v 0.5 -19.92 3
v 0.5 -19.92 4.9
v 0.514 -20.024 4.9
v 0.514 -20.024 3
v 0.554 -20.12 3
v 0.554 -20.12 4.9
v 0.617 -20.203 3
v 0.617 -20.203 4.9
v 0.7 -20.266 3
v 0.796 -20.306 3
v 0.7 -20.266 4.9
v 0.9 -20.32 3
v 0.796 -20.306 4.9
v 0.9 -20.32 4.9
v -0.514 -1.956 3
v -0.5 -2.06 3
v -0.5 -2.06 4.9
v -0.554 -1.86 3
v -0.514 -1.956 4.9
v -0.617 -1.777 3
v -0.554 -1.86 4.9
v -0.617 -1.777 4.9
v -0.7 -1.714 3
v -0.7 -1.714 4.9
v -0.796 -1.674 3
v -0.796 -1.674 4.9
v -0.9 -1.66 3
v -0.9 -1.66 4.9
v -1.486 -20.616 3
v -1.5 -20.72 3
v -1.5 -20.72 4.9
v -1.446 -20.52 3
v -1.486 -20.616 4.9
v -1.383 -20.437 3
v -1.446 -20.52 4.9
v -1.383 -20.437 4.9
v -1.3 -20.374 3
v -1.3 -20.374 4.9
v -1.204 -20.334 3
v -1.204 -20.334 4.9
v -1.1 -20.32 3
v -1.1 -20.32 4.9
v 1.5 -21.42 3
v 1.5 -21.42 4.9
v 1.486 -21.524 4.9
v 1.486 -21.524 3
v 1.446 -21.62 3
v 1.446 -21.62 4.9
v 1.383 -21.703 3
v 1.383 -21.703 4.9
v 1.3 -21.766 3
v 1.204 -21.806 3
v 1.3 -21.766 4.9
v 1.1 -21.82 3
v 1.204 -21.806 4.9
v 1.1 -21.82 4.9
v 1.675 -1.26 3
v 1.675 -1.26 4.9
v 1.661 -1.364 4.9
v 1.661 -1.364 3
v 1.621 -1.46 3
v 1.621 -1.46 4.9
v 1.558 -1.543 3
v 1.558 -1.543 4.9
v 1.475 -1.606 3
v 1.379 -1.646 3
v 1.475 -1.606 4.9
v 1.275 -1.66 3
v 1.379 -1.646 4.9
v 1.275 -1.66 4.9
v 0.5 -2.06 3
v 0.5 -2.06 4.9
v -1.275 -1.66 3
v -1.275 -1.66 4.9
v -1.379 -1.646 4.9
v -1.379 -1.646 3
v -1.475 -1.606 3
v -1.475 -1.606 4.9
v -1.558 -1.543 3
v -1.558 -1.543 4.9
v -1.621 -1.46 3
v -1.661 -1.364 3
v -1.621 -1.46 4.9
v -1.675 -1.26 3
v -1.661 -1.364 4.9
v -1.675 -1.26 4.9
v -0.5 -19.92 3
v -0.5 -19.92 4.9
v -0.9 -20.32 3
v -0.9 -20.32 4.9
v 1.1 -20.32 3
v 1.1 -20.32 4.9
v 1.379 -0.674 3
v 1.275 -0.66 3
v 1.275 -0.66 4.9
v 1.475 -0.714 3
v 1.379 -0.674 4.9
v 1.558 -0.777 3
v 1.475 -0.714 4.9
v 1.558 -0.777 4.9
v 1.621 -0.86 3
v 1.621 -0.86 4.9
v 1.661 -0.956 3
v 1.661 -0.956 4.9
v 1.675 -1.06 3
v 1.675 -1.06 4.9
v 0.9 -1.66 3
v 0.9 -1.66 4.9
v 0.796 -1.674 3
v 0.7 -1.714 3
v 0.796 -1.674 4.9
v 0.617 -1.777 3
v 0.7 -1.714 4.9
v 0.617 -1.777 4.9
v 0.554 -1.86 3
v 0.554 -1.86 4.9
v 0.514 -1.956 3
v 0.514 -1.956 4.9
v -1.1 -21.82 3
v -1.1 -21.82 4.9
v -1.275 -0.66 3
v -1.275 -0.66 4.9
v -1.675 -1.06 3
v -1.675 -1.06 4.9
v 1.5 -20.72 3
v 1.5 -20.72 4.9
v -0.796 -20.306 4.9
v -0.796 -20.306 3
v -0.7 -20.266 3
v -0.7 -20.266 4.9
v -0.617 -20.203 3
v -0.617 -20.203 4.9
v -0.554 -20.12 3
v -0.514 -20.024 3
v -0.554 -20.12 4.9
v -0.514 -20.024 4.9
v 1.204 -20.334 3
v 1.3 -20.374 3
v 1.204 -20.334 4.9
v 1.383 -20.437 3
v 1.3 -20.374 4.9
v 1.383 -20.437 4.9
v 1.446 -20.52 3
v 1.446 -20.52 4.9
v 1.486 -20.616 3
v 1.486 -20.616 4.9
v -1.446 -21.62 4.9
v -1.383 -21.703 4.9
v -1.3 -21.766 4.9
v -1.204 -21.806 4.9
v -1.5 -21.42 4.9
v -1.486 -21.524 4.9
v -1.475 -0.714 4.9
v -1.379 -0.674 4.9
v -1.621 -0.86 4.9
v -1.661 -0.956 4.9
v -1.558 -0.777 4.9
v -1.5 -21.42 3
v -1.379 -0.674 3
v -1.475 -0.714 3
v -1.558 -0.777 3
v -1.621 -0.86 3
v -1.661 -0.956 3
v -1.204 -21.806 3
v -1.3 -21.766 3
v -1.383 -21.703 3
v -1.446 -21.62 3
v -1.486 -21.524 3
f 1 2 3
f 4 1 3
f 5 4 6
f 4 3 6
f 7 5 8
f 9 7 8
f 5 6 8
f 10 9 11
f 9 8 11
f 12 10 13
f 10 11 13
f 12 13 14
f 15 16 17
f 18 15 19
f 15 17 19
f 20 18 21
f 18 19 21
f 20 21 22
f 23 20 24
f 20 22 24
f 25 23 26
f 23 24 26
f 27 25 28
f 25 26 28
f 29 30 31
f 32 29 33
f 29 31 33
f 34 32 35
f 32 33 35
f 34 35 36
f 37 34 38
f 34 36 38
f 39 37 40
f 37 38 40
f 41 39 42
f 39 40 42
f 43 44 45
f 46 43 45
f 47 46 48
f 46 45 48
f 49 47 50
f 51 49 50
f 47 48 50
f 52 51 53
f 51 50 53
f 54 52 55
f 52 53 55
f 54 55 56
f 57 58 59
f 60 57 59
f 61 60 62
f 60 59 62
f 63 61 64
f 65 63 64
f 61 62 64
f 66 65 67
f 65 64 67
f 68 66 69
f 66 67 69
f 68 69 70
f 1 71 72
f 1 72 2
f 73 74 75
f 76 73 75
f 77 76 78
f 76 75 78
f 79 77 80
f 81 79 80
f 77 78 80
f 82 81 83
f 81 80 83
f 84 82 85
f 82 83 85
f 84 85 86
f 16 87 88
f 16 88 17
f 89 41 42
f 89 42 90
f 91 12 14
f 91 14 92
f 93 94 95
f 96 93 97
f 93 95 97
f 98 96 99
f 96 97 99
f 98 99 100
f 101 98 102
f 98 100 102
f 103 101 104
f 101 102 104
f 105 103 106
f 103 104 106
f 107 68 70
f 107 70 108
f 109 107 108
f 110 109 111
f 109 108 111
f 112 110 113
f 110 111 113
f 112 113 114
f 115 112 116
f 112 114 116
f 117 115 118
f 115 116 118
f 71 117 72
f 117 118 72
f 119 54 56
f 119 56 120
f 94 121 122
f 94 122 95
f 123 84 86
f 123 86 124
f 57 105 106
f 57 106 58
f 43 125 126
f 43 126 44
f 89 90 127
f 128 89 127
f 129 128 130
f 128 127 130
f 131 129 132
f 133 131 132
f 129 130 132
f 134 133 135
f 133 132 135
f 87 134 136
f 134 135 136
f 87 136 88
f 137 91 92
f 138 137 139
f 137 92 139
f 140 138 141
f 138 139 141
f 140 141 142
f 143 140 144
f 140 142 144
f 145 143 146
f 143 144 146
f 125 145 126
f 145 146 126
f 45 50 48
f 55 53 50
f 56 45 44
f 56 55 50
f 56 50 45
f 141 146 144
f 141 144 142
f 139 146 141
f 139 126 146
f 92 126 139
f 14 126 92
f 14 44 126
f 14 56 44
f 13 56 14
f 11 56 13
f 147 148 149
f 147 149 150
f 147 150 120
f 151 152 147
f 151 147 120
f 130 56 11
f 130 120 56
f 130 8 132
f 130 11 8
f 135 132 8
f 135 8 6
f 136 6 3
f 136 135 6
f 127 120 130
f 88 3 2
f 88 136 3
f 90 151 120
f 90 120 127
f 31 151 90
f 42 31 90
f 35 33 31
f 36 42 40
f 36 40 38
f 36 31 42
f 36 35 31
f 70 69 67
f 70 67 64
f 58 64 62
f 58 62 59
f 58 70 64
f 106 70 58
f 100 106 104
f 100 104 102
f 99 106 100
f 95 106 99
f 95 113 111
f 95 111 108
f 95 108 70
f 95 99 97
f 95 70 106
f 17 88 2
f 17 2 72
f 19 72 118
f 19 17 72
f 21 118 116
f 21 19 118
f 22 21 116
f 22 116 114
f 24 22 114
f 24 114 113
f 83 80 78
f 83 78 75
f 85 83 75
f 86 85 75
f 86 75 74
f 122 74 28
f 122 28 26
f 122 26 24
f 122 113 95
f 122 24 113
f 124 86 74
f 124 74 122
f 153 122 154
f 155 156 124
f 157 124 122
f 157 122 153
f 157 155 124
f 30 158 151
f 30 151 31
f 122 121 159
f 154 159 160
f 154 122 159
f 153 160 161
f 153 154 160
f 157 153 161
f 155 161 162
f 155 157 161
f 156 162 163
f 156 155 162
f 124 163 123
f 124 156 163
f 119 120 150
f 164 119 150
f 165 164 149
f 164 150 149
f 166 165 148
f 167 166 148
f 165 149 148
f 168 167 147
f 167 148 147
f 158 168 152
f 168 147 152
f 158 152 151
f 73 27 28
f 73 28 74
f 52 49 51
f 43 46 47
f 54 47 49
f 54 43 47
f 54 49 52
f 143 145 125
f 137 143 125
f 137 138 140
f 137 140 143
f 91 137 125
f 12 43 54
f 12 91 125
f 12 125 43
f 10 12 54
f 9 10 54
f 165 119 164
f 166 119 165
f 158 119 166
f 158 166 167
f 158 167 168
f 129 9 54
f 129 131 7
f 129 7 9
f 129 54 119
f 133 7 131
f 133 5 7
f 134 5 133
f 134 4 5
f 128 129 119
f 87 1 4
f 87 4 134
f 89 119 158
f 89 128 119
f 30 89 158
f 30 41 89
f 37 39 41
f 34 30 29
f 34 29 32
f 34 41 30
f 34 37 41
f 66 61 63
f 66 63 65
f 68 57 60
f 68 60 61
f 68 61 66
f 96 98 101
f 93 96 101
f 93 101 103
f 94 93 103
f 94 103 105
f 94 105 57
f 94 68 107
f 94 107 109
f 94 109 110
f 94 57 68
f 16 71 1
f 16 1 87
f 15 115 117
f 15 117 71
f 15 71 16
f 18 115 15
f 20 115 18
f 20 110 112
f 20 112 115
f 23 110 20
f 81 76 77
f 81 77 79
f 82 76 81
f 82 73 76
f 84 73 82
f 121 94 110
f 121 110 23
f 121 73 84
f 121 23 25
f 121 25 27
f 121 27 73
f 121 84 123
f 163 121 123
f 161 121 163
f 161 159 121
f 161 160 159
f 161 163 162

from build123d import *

# Parameters (mm, degrees)
PAD002_DEPTH    = 2
FILLET003_R     = 0.4
POCKET010_DEPTH = 0.1


with BuildPart() as part:
    # Sketch009 → Pad002 (new body)
    with BuildSketch(Plane.XY):
        Polygon((-1.675, -0.66), (1.675, -0.66), (1.675, -1.66), (0.5, -1.66), (0.5, -20.32), (1.5, -20.32), (1.5, -21.82), (-1.5, -21.82), (-1.5, -20.32), (-0.5, -20.32), (-0.5, -1.66), (-1.675, -1.66), align=None)
    extrude(amount=PAD002_DEPTH)

    # Fillet003
    fillet003_edges = [part.edges().sort_by_distance(p)[0] for p in [
        (-1.675, -1.66, 1),
        (-1.675, -0.66, 1),
        (1.675, -0.66, 1),
        (1.675, -1.66, 1),
        (0.5, -1.66, 1),
        (-0.5, -1.66, 1),
        (-0.5, -20.32, 1),
        (-1.5, -20.32, 1),
        (-1.5, -21.82, 1),
        (1.5, -21.82, 1),
        (1.5, -20.32, 1),
        (0.5, -20.32, 1),
    ]]
    fillet(fillet003_edges, radius=FILLET003_R)

    # Fillet003 Face5 → Pocket010 (cut)
    with BuildSketch(Plane(origin=(0, -11.4600006044, 2), x_dir=(0, 1, 0), z_dir=(0, 0, 1))):
        with BuildLine():
            Line((9.8000006044, 1.275), (9.8000006044, 0.9))
            ThreePointArc((9.8000006044, 0.9), (9.6828433168, 0.6171572875), (9.4000006044, 0.5))
            Line((9.4000006044, 0.5), (-8.4599993956, 0.5))
            ThreePointArc((-8.4599993956, 0.5), (-8.7428421081, 0.6171572875), (-8.8599993956, 0.9))
            Line((-8.8599993956, 0.9), (-8.8599993956, 1.1))
            ThreePointArc((-8.8599993956, 1.1), (-8.9771566832, 1.3828427125), (-9.2599993956, 1.5))
            Line((-9.2599993956, 1.5), (-9.9599993956, 1.5))
            ThreePointArc((-9.9599993956, 1.5), (-10.2428421081, 1.3828427125), (-10.3599993956, 1.1))
            Line((-10.3599993956, 1.1), (-10.3599993956, -1.1))
            ThreePointArc((-10.3599993956, -1.1), (-10.2428421081, -1.3828427125), (-9.9599993956, -1.5))
            Line((-9.9599993956, -1.5), (-9.2599993956, -1.5))
            ThreePointArc((-9.2599993956, -1.5), (-8.9771566832, -1.3828427125), (-8.8599993956, -1.1))
            Line((-8.8599993956, -1.1), (-8.8599993956, -0.9))
            ThreePointArc((-8.8599993956, -0.9), (-8.7428421081, -0.6171572875), (-8.4599993956, -0.5))
            Line((-8.4599993956, -0.5), (9.4000006044, -0.5))
            ThreePointArc((9.4000006044, -0.5), (9.6828433168, -0.6171572875), (9.8000006044, -0.9))
            Line((9.8000006044, -0.9), (9.8000006044, -1.275))
            ThreePointArc((9.8000006044, -1.275), (9.9171578919, -1.5578427125), (10.2000006044, -1.675))
            Line((10.2000006044, -1.675), (10.4000006044, -1.675))
            ThreePointArc((10.4000006044, -1.675), (10.6828433168, -1.5578427125), (10.8000006044, -1.275))
            Line((10.8000006044, -1.275), (10.8000006044, 1.275))
            ThreePointArc((10.8000006044, 1.275), (10.6828433168, 1.5578427125), (10.4000006044, 1.675))
            Line((10.4000006044, 1.675), (10.2000006044, 1.675))
            ThreePointArc((10.2000006044, 1.675), (9.9171578919, 1.5578427125), (9.8000006044, 1.275))
        make_face()
    extrude(amount=-POCKET010_DEPTH, mode=Mode.SUBTRACT)


with BuildPart() as part_1:
    # Body002 placement: moved
    add(part.part.moved(Location((0, 0, 3))))


solid = part_1.part
